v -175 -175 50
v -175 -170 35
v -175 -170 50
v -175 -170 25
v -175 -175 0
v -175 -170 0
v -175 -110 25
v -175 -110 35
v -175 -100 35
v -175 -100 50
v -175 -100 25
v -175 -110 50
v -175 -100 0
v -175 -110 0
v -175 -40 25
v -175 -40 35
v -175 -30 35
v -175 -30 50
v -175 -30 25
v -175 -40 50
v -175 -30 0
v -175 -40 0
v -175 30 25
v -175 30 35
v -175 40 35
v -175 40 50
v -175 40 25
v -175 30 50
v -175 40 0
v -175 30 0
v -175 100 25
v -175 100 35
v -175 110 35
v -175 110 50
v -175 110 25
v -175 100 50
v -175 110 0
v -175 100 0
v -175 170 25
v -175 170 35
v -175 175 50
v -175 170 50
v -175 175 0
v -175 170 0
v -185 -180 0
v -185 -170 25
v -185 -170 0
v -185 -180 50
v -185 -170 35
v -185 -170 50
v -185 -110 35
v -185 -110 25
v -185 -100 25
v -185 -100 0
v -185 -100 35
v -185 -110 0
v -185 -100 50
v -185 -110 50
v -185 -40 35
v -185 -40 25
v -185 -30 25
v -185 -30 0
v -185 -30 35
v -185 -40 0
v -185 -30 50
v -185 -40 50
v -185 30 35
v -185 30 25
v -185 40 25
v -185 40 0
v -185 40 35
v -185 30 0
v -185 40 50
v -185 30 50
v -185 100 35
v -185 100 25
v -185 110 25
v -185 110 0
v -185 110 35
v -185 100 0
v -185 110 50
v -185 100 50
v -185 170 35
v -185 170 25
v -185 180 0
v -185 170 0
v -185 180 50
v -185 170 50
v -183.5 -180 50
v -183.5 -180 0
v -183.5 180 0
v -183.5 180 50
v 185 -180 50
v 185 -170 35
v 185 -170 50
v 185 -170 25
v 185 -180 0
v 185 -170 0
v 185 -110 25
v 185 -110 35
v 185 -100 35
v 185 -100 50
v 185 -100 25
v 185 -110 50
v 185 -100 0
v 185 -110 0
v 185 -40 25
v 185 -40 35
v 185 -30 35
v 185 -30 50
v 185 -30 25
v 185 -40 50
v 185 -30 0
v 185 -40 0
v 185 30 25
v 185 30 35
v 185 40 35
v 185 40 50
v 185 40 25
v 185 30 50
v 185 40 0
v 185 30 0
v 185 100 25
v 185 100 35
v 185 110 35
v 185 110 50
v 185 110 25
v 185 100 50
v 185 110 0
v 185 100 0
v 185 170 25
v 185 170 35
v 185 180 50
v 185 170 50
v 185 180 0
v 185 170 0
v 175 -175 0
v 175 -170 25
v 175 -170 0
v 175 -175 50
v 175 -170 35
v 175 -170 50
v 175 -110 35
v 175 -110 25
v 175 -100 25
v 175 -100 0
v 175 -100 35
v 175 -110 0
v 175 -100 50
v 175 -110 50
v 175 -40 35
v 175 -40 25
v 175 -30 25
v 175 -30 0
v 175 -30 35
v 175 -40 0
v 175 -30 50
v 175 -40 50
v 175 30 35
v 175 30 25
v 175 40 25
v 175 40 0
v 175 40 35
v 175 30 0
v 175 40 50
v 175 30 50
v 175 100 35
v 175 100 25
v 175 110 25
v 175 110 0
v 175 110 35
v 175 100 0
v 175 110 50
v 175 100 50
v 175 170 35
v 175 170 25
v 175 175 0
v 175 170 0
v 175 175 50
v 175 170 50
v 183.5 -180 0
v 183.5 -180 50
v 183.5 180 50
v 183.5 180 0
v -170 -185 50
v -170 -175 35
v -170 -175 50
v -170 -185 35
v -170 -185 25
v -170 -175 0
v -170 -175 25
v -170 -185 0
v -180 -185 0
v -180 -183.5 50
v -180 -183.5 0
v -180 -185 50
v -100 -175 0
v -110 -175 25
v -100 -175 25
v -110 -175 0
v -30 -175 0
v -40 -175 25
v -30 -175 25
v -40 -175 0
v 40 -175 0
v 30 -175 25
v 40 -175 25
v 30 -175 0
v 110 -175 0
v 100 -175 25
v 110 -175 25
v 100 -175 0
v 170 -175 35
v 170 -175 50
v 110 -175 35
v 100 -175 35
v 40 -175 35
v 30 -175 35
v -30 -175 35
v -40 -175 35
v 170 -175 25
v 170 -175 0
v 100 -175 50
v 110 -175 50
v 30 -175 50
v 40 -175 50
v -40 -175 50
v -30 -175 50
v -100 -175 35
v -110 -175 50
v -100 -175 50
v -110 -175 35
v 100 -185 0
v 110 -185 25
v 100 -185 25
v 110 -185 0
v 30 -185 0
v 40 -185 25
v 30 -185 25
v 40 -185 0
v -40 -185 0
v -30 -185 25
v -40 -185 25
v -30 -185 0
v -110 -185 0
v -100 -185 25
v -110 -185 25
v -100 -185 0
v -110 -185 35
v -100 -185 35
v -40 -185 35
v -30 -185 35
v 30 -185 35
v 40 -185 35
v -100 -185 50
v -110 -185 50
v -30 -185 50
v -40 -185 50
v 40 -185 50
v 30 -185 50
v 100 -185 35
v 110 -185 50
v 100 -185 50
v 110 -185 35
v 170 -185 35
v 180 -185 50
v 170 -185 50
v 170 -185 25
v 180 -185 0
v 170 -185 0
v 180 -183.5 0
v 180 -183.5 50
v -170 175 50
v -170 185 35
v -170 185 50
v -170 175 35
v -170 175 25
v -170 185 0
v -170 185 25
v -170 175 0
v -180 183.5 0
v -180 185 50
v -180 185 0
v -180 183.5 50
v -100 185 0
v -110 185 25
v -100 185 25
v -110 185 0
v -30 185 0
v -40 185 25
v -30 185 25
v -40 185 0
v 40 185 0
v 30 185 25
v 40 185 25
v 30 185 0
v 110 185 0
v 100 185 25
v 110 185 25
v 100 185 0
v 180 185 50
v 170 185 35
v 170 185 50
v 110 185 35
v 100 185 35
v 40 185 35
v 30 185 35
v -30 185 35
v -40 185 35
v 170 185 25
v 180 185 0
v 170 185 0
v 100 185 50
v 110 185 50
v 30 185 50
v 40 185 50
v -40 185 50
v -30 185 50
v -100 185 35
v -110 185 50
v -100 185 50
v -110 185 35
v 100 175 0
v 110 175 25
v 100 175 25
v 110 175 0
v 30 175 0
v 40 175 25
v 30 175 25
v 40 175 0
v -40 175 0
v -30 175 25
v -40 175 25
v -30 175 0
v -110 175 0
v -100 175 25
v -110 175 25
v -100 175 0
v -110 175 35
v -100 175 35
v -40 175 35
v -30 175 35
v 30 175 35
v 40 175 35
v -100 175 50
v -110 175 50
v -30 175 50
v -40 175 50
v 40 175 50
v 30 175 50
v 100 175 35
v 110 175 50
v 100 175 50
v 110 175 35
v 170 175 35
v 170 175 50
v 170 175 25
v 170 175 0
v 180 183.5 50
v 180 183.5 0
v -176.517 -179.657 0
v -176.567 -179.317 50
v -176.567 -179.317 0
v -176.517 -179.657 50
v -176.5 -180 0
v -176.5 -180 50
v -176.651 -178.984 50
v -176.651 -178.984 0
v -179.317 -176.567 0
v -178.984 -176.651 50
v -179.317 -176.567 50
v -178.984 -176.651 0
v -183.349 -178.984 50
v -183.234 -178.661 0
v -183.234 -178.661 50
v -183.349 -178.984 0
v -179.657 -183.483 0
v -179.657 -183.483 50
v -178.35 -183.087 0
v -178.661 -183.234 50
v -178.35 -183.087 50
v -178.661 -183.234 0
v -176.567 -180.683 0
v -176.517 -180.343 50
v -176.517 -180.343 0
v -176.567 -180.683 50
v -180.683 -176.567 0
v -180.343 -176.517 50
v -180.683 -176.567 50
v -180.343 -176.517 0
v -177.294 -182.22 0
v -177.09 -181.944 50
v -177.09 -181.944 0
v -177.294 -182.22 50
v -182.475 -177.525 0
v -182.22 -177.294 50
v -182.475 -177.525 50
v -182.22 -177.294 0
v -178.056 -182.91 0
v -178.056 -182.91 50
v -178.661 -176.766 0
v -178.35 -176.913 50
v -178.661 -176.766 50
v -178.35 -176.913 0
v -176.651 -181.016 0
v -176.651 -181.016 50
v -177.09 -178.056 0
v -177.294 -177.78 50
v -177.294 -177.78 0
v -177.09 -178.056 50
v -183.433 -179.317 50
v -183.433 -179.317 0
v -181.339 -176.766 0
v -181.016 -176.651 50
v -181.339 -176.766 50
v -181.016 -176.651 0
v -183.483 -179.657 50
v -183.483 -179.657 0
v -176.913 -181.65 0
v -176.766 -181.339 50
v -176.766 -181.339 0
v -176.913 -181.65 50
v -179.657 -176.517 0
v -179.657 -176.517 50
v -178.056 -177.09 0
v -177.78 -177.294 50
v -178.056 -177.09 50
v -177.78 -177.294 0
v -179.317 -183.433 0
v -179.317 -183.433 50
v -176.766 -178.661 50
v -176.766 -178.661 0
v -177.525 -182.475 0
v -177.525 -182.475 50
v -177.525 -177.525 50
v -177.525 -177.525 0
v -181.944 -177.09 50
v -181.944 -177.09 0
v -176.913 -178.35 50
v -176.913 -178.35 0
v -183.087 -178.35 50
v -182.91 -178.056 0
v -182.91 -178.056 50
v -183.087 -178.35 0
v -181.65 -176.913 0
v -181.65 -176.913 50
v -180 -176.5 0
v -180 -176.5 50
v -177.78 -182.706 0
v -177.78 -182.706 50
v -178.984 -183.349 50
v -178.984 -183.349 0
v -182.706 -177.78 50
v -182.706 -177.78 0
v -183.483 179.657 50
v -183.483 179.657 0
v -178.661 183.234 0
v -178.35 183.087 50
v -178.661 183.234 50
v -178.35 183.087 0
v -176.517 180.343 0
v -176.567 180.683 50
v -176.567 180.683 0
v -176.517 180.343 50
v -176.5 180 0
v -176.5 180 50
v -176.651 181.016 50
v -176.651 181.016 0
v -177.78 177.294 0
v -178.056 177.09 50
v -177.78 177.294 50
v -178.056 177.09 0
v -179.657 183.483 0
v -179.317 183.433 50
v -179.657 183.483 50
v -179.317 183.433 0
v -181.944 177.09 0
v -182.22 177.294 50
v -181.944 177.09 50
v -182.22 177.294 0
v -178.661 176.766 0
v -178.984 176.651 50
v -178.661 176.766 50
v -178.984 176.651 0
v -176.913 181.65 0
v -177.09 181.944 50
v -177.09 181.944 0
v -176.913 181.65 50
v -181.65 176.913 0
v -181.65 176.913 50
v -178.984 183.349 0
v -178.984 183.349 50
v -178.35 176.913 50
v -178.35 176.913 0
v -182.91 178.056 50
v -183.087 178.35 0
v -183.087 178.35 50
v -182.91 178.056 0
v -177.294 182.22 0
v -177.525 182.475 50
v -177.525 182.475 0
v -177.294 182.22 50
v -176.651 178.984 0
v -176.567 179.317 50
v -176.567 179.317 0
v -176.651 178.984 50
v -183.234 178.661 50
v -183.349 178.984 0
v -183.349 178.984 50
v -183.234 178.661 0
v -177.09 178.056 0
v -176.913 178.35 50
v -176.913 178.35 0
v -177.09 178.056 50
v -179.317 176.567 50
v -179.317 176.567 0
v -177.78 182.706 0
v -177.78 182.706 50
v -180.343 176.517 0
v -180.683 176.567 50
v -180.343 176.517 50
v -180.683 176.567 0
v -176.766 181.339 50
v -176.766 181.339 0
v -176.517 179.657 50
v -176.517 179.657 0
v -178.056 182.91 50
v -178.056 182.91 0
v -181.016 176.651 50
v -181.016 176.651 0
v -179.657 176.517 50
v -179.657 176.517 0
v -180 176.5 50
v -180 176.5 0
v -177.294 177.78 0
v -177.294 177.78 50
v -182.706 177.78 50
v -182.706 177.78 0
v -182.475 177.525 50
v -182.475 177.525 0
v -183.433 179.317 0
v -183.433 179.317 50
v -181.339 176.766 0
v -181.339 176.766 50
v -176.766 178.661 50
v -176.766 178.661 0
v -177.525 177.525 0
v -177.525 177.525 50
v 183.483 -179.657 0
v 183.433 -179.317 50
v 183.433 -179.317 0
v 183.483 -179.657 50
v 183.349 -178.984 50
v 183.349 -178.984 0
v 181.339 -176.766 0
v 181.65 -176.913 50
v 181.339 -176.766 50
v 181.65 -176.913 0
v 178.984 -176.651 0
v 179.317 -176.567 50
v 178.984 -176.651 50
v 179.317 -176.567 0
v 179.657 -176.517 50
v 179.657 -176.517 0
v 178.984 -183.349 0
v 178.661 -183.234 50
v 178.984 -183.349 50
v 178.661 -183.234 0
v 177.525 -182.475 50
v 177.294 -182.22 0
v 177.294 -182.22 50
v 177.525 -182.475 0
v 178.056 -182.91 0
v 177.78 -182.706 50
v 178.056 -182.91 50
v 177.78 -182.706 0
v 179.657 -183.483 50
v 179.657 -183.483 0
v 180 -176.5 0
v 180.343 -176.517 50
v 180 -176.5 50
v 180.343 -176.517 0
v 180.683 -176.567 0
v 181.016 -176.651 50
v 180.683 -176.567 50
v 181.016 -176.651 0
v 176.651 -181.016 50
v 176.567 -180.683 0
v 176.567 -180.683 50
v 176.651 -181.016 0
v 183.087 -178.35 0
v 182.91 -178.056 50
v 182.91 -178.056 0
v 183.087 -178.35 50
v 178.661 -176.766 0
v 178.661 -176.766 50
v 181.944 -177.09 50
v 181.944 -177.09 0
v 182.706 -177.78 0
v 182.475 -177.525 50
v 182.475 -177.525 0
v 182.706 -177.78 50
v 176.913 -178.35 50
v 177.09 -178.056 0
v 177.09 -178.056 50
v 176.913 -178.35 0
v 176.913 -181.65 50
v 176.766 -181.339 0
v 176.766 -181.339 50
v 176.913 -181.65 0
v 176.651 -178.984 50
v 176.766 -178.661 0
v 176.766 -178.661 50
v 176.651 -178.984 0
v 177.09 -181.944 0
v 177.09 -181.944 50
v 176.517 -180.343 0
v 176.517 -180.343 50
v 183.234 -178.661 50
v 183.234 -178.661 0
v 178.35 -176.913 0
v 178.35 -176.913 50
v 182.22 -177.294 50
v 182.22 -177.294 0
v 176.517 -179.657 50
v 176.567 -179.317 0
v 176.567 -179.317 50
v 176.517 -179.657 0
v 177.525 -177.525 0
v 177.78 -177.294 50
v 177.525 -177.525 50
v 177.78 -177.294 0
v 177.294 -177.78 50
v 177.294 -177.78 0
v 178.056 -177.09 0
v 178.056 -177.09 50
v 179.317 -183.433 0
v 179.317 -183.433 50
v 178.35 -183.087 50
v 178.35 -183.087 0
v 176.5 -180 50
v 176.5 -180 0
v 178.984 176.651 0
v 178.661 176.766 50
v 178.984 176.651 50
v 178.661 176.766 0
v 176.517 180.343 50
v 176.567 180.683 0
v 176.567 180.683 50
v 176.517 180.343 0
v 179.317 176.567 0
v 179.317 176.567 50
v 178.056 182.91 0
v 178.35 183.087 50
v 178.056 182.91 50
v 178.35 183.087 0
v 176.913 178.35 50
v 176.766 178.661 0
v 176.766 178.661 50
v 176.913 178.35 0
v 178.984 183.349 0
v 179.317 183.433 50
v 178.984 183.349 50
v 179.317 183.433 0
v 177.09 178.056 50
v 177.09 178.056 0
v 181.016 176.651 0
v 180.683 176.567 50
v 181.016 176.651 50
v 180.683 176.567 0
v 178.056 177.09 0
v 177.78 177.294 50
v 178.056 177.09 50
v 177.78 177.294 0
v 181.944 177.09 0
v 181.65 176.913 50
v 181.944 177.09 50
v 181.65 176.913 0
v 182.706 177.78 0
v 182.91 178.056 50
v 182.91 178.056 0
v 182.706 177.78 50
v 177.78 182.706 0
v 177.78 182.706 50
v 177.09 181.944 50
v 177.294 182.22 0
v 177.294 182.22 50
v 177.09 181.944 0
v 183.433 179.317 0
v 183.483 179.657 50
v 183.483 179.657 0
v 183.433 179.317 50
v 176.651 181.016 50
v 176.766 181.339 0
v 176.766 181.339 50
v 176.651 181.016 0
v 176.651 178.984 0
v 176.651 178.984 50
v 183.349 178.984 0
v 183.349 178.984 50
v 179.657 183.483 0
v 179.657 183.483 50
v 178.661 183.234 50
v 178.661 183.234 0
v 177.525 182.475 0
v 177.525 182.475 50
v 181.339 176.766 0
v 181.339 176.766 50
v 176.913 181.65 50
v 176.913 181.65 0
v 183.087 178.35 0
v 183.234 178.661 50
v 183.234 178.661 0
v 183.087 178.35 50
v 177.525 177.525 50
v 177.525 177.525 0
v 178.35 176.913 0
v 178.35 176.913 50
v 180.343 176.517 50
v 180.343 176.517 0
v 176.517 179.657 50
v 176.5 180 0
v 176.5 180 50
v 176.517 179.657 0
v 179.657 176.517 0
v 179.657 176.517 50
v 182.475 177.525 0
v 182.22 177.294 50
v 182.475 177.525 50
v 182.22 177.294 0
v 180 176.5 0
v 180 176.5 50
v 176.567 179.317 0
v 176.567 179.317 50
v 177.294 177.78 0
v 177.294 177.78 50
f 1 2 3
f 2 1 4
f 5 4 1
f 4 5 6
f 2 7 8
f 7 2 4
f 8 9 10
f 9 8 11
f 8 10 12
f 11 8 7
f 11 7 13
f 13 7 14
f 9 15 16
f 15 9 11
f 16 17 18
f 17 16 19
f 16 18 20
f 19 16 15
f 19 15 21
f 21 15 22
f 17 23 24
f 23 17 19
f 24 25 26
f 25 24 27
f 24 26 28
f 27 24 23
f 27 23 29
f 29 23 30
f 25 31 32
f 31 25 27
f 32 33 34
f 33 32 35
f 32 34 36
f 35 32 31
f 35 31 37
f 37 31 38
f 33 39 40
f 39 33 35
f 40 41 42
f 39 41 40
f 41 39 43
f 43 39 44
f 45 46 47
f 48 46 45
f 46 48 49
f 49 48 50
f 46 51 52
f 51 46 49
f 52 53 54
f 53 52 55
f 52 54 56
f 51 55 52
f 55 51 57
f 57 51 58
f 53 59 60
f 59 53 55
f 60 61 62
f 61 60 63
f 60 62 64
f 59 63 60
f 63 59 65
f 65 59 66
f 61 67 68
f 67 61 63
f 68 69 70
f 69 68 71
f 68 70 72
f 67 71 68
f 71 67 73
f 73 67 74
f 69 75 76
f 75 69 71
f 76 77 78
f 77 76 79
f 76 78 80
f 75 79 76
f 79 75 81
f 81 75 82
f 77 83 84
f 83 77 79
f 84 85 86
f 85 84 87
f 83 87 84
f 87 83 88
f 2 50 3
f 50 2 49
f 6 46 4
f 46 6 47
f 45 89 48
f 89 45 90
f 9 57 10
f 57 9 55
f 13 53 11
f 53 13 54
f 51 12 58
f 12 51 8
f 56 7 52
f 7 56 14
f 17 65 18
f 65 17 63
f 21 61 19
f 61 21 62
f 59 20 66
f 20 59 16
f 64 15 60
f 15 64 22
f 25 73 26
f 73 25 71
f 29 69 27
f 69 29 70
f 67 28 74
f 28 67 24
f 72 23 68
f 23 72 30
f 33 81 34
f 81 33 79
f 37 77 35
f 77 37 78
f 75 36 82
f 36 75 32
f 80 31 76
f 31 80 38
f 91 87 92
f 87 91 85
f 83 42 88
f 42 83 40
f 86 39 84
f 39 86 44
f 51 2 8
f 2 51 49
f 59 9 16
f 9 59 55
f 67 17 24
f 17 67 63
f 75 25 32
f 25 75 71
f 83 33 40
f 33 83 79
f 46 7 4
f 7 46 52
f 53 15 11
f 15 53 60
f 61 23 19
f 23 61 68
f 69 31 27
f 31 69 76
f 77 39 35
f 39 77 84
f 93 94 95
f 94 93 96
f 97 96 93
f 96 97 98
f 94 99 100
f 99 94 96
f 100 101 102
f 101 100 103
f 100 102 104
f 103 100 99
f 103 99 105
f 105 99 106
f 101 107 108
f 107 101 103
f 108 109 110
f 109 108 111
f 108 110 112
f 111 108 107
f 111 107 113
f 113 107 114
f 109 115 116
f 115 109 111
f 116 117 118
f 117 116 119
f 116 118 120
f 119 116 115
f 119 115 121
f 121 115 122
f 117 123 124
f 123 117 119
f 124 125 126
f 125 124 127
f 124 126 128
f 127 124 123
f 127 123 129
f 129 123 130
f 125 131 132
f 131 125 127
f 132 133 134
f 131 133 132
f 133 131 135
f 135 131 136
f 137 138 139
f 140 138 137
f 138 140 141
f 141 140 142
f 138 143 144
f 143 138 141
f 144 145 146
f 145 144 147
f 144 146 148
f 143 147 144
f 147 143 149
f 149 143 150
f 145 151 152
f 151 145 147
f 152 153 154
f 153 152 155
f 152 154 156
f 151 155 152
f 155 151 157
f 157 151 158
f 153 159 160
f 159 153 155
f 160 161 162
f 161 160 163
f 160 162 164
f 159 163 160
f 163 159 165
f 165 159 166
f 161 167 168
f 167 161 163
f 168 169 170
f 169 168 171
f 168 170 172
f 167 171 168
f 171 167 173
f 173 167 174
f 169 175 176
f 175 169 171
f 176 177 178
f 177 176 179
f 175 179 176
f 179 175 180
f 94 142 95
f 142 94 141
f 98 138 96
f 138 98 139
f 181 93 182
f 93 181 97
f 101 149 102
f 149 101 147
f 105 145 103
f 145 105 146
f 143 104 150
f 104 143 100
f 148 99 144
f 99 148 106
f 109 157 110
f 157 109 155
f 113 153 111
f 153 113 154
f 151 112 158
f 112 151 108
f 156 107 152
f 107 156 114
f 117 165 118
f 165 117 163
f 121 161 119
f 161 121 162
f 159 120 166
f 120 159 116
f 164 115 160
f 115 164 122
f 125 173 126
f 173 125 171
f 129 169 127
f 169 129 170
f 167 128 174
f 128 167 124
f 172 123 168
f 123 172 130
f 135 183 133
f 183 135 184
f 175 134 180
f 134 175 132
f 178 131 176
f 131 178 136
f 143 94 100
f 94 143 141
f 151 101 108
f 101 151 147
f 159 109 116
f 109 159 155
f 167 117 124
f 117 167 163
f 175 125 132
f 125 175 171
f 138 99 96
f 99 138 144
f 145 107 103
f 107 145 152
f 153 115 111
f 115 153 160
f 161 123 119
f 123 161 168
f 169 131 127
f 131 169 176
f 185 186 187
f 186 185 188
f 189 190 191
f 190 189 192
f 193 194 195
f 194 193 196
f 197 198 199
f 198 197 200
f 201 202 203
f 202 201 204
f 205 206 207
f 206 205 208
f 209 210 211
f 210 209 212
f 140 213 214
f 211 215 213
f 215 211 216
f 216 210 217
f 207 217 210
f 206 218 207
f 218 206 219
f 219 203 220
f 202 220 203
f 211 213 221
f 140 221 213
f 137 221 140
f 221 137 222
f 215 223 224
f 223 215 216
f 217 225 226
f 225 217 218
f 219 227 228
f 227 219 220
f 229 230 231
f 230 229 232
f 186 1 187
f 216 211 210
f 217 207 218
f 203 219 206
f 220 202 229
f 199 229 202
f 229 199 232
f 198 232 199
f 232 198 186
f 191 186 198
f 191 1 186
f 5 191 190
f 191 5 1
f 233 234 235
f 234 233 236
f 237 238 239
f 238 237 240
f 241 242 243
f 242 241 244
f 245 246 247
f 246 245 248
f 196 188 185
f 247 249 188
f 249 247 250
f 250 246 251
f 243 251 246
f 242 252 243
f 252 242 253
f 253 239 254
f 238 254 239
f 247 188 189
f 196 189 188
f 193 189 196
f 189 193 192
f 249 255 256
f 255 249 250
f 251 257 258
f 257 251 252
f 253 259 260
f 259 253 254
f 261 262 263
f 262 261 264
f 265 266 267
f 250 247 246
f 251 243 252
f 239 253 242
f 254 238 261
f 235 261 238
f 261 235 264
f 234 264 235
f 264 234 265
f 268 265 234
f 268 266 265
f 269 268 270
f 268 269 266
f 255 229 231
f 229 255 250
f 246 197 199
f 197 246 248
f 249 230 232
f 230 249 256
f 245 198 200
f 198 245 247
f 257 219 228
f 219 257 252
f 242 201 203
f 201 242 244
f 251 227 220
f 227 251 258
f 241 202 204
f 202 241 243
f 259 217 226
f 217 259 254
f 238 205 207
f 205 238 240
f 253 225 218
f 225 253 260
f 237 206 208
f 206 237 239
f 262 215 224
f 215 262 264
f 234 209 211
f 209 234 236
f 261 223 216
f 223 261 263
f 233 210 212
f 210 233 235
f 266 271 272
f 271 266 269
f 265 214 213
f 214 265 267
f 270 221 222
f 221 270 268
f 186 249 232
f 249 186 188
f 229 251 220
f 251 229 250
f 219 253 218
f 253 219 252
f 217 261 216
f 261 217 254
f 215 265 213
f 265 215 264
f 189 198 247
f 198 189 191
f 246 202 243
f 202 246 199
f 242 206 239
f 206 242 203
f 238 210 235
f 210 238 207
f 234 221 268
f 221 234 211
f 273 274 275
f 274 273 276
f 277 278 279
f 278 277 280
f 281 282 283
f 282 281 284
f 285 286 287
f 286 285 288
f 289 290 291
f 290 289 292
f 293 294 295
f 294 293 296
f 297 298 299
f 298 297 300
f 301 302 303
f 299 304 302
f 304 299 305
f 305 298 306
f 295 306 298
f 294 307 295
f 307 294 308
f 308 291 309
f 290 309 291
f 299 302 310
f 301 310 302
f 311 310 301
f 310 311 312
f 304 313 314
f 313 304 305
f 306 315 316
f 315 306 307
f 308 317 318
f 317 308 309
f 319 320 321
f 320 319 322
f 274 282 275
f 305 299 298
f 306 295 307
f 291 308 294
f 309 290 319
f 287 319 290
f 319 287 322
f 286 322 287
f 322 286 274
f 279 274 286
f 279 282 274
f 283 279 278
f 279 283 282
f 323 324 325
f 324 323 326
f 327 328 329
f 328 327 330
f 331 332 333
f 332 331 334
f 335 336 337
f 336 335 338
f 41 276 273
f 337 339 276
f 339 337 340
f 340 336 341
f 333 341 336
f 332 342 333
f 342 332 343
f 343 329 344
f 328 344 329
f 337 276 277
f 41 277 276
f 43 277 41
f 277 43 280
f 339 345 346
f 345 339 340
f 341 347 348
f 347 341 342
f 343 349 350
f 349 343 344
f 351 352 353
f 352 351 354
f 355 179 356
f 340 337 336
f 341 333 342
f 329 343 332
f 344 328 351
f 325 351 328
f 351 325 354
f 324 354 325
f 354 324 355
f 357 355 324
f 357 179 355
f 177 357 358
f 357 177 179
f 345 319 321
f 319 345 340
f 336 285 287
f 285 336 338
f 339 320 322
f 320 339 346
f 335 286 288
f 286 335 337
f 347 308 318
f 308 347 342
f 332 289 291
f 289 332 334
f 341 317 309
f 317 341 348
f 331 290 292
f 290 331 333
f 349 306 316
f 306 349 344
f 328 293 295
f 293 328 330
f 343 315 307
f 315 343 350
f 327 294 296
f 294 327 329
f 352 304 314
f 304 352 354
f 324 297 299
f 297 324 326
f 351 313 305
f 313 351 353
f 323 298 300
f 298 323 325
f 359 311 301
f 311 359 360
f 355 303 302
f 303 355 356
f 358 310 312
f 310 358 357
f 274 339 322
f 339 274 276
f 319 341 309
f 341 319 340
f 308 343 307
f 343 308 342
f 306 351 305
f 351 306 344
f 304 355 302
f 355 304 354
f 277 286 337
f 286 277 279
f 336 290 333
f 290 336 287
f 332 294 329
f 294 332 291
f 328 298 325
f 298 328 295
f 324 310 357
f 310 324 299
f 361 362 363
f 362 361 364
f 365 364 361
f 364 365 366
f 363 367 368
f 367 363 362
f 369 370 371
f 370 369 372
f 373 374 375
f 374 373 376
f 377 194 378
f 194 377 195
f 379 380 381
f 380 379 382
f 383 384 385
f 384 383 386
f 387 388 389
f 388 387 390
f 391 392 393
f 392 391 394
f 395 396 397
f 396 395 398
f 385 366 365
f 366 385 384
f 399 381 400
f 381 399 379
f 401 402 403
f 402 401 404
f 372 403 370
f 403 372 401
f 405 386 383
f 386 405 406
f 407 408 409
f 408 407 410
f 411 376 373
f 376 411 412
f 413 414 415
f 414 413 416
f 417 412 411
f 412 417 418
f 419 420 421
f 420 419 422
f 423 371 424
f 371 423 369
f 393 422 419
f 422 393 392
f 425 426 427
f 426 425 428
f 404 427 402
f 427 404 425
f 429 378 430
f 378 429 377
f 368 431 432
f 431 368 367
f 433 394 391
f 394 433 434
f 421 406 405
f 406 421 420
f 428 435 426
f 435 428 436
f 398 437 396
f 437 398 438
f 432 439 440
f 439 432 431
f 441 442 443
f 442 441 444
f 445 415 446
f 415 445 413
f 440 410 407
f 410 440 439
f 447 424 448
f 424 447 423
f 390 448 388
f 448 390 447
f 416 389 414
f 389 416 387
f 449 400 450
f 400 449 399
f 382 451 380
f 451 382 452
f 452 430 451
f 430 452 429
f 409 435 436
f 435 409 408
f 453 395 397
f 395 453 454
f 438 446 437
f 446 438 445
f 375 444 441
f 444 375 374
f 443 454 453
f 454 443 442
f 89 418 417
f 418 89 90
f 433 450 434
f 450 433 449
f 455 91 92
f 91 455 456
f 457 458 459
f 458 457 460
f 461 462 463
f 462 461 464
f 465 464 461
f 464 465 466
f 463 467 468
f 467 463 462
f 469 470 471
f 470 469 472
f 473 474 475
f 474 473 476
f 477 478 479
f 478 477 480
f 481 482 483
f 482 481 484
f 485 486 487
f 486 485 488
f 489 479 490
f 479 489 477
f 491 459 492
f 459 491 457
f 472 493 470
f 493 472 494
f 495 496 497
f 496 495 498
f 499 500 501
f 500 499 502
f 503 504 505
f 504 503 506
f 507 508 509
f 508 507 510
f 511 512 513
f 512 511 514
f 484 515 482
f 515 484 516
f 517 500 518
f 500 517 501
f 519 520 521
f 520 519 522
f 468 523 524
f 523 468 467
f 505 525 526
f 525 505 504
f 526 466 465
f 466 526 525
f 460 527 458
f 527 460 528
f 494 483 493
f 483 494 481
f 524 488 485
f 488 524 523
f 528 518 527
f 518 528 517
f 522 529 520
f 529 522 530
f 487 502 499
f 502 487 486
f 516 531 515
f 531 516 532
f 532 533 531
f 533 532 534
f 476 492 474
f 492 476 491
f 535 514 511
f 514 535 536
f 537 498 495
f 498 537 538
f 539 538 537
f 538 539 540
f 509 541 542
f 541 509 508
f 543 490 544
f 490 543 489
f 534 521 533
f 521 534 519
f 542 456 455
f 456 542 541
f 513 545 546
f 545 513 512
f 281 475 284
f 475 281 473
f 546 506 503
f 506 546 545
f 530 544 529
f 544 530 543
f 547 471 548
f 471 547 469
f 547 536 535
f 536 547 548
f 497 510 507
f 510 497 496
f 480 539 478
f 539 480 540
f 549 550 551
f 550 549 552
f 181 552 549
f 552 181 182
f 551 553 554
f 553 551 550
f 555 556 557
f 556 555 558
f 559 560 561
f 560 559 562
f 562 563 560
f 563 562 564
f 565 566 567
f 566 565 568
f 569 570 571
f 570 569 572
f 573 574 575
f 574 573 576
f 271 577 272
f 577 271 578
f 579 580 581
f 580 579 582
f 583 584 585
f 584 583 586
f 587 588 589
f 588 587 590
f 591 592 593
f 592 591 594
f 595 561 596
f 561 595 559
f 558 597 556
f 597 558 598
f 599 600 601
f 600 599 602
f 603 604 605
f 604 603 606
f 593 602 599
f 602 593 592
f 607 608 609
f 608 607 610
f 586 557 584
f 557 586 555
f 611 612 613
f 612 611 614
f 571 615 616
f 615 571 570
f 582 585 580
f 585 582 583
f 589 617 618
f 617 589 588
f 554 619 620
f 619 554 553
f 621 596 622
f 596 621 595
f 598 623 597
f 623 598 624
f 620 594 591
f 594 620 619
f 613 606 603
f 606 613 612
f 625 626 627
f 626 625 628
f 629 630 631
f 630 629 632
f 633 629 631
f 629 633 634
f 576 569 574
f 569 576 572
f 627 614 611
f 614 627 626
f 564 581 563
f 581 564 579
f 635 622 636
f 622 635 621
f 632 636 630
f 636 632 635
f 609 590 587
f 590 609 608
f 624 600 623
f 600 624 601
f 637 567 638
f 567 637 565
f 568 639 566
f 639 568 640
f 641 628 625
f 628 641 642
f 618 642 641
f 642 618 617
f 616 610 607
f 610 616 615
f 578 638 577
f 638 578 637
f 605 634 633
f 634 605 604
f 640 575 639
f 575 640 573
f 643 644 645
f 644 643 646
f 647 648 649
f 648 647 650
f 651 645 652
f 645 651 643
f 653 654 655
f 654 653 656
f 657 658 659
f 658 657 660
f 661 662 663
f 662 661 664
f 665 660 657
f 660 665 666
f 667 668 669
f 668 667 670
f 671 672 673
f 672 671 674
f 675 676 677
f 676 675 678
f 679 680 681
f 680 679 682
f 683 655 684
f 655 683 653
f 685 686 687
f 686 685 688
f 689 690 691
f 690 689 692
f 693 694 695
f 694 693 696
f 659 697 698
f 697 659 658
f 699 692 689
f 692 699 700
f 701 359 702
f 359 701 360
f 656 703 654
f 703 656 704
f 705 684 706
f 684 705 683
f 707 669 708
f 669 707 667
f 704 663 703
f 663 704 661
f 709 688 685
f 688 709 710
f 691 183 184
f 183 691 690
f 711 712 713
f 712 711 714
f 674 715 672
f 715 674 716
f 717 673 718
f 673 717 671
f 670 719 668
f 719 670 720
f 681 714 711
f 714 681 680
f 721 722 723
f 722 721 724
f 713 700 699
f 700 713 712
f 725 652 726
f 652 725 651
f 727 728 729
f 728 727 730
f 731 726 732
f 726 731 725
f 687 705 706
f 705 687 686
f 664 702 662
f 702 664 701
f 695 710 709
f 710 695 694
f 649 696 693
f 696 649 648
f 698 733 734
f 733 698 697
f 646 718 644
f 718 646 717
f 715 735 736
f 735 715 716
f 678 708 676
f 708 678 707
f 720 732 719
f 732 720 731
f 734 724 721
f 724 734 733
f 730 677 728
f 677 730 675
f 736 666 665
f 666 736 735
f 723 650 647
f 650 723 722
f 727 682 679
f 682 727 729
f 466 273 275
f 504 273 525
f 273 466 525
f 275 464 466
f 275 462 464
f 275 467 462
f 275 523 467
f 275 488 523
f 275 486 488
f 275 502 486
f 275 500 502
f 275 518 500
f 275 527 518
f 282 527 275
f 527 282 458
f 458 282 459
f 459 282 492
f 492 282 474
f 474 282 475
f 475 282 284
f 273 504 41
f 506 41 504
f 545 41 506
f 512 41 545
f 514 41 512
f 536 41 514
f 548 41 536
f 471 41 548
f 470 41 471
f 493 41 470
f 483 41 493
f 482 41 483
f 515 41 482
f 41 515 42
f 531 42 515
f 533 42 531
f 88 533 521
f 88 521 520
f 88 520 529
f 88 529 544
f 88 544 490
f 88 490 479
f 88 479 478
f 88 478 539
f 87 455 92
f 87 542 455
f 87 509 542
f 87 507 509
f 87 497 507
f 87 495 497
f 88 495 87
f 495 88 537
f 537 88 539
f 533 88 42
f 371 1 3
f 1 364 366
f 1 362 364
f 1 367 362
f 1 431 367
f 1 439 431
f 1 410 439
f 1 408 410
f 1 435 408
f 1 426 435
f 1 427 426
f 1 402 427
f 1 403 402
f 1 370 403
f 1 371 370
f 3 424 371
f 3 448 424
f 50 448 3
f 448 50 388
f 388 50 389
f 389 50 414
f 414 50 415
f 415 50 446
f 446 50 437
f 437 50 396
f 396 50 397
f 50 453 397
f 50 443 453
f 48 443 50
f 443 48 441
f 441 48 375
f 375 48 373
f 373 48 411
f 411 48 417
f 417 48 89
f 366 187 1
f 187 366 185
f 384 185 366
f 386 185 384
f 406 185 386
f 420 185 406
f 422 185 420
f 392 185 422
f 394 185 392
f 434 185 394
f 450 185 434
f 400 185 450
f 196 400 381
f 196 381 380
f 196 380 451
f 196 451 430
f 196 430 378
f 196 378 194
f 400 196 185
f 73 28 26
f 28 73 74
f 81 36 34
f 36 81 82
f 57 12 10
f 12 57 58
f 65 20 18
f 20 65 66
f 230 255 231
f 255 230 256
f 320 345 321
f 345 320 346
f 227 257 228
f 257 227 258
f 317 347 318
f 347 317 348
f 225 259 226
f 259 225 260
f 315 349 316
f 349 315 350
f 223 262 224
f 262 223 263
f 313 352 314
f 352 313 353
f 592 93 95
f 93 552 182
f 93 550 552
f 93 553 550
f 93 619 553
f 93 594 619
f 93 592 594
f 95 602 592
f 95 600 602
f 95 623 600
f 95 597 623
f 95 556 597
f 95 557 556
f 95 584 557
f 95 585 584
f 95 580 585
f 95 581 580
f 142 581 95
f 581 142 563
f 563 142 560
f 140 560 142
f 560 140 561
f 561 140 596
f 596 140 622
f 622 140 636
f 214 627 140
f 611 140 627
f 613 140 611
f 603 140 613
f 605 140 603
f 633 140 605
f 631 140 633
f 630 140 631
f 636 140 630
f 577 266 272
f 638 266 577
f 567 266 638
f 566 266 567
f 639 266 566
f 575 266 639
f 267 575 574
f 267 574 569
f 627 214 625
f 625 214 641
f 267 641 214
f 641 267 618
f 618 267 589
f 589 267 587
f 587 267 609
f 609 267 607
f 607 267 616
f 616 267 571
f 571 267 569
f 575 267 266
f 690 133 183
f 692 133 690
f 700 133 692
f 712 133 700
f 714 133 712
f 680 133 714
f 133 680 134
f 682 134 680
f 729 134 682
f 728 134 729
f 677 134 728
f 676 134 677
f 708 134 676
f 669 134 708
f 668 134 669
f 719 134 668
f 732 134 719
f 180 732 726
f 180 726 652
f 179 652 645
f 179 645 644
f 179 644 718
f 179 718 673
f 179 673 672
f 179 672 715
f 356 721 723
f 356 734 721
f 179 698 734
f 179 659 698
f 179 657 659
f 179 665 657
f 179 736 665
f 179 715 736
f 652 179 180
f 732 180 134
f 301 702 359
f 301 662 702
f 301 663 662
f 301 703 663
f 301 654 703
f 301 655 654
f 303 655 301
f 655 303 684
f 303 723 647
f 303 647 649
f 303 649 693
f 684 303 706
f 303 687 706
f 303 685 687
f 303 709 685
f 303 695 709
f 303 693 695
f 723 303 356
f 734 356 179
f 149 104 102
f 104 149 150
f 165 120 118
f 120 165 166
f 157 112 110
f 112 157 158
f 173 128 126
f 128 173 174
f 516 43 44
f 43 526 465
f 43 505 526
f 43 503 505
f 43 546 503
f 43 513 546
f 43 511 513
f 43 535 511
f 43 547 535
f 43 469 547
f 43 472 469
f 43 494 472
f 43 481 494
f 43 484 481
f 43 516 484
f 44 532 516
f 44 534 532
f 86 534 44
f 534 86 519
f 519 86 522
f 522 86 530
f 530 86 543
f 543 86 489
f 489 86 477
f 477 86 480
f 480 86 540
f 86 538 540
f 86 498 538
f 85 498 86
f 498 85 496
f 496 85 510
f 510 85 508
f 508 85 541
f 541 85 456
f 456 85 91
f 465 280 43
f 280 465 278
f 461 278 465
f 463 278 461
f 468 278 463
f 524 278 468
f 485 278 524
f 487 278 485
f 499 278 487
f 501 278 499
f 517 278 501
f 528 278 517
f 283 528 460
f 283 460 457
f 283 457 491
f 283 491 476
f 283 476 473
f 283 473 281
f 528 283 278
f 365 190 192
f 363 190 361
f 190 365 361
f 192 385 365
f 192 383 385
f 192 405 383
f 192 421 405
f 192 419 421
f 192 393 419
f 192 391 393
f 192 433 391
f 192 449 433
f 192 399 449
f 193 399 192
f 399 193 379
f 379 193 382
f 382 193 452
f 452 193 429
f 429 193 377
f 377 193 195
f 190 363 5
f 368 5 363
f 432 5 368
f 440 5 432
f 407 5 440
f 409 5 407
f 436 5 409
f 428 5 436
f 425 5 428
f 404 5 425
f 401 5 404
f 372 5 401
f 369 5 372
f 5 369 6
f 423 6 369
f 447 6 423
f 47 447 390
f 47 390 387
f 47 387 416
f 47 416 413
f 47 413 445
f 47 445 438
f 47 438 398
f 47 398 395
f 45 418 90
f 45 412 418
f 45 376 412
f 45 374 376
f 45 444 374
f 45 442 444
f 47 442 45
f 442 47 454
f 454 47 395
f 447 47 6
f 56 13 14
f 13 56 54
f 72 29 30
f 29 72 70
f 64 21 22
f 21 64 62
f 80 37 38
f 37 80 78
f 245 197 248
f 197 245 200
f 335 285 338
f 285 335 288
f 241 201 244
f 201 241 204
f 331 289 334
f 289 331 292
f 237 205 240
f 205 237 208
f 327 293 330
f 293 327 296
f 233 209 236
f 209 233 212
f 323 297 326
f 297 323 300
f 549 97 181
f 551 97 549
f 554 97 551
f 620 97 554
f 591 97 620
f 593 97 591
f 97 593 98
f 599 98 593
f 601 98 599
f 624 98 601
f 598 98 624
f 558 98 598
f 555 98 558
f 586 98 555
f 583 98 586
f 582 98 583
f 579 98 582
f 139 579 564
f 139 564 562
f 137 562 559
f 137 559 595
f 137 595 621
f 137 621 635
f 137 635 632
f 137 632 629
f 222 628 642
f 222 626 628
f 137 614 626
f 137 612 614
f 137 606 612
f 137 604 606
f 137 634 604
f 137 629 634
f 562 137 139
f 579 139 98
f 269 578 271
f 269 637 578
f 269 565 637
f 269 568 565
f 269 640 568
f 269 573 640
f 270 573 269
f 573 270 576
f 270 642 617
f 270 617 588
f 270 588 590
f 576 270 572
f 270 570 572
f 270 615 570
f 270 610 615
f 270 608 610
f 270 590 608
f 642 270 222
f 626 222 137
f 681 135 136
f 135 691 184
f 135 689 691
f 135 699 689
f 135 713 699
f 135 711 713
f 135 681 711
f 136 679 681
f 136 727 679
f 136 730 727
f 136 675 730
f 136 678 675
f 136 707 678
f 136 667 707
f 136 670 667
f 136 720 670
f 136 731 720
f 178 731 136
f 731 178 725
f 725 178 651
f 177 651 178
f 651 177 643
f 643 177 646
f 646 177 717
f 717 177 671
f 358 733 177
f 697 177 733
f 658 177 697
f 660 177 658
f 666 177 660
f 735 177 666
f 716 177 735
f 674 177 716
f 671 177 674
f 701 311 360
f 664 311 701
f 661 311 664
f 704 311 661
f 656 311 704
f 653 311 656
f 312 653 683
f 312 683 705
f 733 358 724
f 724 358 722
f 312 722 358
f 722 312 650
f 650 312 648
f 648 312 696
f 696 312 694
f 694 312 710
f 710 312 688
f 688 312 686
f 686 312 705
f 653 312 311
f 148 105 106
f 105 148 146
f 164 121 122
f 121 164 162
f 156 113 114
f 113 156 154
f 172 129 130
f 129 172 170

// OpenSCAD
/*
  Cage slice 02 of 15
*/

bar = 10;
half_inner = 175;
gap = 70;
rod_d = 7;
half_outer = half_inner + bar;

function grid_pos(n) = -half_inner + n * gap;

module cage_full() {
  difference() {
    union() {
      // Floor grid at z = -10 .. 0
      for (j = [0:5]) {
        y = grid_pos(j);
        translate([-half_inner, y - bar/2, -bar])
          cube([2*half_inner, bar, bar], center=false);
      }
      for (i = [0:5]) {
        x = grid_pos(i);
        translate([x - bar/2, -half_inner, -bar])
          cube([bar, 2*half_inner, bar], center=false);
      }

      // Roof grid at z = 700 .. 710
      for (j = [0:5]) {
        y = grid_pos(j);
        translate([-half_inner, y - bar/2, 700])
          cube([2*half_inner, bar, bar], center=false);
      }
      for (i = [0:5]) {
        x = grid_pos(i);
        translate([x - bar/2, -half_inner, 700])
          cube([bar, 2*half_inner, bar], center=false);
      }

      // Side walls at x = ±175
      for (side = [-1, 1]) {
        sx = side * half_inner;
        x0 = (side == 1) ? sx : sx - bar;
        for (j = [0:5]) {
          y = grid_pos(j);
          translate([x0, y - bar/2, 0])
            cube([bar, bar, 700], center=false);
        }
        for (k = [0:10]) {
          zc = 0 + k * gap;
          translate([x0, -half_inner, zc - bar/2])
            cube([bar, 2*half_inner, bar], center=false);
        }
      }

      // Front/back walls at y = ±175
      for (side = [-1, 1]) {
        sy = side * half_inner;
        y0 = (side == 1) ? sy : sy - bar;
        for (i = [0:5]) {
          x = grid_pos(i);
          translate([x - bar/2, y0, 0])
            cube([bar, bar, 700], center=false);
        }
        for (k = [0:10]) {
          zc = 0 + k * gap;
          translate([-half_inner, y0, zc - bar/2])
            cube([2*half_inner, bar, bar], center=false);
        }
      }
    }

    for (sx = [-1, 1], sy = [-1, 1]) {
      translate([sx * (half_inner + bar/2),
                 sy * (half_inner + bar/2),
                 -20])
        cylinder(d = rod_d, h = 740, $fn = 64);
    }
  }
}

z_min = 40;
z_max = 90;   // height 50 mm

module slice() {
  intersection() {
    cage_full();
    translate([-half_outer - 5, -half_outer - 5, z_min])
      cube([2*(half_outer + 5), 2*(half_outer + 5), z_max - z_min], center=false);
  }
}

translate([0, 0, -z_min])
  slice();
